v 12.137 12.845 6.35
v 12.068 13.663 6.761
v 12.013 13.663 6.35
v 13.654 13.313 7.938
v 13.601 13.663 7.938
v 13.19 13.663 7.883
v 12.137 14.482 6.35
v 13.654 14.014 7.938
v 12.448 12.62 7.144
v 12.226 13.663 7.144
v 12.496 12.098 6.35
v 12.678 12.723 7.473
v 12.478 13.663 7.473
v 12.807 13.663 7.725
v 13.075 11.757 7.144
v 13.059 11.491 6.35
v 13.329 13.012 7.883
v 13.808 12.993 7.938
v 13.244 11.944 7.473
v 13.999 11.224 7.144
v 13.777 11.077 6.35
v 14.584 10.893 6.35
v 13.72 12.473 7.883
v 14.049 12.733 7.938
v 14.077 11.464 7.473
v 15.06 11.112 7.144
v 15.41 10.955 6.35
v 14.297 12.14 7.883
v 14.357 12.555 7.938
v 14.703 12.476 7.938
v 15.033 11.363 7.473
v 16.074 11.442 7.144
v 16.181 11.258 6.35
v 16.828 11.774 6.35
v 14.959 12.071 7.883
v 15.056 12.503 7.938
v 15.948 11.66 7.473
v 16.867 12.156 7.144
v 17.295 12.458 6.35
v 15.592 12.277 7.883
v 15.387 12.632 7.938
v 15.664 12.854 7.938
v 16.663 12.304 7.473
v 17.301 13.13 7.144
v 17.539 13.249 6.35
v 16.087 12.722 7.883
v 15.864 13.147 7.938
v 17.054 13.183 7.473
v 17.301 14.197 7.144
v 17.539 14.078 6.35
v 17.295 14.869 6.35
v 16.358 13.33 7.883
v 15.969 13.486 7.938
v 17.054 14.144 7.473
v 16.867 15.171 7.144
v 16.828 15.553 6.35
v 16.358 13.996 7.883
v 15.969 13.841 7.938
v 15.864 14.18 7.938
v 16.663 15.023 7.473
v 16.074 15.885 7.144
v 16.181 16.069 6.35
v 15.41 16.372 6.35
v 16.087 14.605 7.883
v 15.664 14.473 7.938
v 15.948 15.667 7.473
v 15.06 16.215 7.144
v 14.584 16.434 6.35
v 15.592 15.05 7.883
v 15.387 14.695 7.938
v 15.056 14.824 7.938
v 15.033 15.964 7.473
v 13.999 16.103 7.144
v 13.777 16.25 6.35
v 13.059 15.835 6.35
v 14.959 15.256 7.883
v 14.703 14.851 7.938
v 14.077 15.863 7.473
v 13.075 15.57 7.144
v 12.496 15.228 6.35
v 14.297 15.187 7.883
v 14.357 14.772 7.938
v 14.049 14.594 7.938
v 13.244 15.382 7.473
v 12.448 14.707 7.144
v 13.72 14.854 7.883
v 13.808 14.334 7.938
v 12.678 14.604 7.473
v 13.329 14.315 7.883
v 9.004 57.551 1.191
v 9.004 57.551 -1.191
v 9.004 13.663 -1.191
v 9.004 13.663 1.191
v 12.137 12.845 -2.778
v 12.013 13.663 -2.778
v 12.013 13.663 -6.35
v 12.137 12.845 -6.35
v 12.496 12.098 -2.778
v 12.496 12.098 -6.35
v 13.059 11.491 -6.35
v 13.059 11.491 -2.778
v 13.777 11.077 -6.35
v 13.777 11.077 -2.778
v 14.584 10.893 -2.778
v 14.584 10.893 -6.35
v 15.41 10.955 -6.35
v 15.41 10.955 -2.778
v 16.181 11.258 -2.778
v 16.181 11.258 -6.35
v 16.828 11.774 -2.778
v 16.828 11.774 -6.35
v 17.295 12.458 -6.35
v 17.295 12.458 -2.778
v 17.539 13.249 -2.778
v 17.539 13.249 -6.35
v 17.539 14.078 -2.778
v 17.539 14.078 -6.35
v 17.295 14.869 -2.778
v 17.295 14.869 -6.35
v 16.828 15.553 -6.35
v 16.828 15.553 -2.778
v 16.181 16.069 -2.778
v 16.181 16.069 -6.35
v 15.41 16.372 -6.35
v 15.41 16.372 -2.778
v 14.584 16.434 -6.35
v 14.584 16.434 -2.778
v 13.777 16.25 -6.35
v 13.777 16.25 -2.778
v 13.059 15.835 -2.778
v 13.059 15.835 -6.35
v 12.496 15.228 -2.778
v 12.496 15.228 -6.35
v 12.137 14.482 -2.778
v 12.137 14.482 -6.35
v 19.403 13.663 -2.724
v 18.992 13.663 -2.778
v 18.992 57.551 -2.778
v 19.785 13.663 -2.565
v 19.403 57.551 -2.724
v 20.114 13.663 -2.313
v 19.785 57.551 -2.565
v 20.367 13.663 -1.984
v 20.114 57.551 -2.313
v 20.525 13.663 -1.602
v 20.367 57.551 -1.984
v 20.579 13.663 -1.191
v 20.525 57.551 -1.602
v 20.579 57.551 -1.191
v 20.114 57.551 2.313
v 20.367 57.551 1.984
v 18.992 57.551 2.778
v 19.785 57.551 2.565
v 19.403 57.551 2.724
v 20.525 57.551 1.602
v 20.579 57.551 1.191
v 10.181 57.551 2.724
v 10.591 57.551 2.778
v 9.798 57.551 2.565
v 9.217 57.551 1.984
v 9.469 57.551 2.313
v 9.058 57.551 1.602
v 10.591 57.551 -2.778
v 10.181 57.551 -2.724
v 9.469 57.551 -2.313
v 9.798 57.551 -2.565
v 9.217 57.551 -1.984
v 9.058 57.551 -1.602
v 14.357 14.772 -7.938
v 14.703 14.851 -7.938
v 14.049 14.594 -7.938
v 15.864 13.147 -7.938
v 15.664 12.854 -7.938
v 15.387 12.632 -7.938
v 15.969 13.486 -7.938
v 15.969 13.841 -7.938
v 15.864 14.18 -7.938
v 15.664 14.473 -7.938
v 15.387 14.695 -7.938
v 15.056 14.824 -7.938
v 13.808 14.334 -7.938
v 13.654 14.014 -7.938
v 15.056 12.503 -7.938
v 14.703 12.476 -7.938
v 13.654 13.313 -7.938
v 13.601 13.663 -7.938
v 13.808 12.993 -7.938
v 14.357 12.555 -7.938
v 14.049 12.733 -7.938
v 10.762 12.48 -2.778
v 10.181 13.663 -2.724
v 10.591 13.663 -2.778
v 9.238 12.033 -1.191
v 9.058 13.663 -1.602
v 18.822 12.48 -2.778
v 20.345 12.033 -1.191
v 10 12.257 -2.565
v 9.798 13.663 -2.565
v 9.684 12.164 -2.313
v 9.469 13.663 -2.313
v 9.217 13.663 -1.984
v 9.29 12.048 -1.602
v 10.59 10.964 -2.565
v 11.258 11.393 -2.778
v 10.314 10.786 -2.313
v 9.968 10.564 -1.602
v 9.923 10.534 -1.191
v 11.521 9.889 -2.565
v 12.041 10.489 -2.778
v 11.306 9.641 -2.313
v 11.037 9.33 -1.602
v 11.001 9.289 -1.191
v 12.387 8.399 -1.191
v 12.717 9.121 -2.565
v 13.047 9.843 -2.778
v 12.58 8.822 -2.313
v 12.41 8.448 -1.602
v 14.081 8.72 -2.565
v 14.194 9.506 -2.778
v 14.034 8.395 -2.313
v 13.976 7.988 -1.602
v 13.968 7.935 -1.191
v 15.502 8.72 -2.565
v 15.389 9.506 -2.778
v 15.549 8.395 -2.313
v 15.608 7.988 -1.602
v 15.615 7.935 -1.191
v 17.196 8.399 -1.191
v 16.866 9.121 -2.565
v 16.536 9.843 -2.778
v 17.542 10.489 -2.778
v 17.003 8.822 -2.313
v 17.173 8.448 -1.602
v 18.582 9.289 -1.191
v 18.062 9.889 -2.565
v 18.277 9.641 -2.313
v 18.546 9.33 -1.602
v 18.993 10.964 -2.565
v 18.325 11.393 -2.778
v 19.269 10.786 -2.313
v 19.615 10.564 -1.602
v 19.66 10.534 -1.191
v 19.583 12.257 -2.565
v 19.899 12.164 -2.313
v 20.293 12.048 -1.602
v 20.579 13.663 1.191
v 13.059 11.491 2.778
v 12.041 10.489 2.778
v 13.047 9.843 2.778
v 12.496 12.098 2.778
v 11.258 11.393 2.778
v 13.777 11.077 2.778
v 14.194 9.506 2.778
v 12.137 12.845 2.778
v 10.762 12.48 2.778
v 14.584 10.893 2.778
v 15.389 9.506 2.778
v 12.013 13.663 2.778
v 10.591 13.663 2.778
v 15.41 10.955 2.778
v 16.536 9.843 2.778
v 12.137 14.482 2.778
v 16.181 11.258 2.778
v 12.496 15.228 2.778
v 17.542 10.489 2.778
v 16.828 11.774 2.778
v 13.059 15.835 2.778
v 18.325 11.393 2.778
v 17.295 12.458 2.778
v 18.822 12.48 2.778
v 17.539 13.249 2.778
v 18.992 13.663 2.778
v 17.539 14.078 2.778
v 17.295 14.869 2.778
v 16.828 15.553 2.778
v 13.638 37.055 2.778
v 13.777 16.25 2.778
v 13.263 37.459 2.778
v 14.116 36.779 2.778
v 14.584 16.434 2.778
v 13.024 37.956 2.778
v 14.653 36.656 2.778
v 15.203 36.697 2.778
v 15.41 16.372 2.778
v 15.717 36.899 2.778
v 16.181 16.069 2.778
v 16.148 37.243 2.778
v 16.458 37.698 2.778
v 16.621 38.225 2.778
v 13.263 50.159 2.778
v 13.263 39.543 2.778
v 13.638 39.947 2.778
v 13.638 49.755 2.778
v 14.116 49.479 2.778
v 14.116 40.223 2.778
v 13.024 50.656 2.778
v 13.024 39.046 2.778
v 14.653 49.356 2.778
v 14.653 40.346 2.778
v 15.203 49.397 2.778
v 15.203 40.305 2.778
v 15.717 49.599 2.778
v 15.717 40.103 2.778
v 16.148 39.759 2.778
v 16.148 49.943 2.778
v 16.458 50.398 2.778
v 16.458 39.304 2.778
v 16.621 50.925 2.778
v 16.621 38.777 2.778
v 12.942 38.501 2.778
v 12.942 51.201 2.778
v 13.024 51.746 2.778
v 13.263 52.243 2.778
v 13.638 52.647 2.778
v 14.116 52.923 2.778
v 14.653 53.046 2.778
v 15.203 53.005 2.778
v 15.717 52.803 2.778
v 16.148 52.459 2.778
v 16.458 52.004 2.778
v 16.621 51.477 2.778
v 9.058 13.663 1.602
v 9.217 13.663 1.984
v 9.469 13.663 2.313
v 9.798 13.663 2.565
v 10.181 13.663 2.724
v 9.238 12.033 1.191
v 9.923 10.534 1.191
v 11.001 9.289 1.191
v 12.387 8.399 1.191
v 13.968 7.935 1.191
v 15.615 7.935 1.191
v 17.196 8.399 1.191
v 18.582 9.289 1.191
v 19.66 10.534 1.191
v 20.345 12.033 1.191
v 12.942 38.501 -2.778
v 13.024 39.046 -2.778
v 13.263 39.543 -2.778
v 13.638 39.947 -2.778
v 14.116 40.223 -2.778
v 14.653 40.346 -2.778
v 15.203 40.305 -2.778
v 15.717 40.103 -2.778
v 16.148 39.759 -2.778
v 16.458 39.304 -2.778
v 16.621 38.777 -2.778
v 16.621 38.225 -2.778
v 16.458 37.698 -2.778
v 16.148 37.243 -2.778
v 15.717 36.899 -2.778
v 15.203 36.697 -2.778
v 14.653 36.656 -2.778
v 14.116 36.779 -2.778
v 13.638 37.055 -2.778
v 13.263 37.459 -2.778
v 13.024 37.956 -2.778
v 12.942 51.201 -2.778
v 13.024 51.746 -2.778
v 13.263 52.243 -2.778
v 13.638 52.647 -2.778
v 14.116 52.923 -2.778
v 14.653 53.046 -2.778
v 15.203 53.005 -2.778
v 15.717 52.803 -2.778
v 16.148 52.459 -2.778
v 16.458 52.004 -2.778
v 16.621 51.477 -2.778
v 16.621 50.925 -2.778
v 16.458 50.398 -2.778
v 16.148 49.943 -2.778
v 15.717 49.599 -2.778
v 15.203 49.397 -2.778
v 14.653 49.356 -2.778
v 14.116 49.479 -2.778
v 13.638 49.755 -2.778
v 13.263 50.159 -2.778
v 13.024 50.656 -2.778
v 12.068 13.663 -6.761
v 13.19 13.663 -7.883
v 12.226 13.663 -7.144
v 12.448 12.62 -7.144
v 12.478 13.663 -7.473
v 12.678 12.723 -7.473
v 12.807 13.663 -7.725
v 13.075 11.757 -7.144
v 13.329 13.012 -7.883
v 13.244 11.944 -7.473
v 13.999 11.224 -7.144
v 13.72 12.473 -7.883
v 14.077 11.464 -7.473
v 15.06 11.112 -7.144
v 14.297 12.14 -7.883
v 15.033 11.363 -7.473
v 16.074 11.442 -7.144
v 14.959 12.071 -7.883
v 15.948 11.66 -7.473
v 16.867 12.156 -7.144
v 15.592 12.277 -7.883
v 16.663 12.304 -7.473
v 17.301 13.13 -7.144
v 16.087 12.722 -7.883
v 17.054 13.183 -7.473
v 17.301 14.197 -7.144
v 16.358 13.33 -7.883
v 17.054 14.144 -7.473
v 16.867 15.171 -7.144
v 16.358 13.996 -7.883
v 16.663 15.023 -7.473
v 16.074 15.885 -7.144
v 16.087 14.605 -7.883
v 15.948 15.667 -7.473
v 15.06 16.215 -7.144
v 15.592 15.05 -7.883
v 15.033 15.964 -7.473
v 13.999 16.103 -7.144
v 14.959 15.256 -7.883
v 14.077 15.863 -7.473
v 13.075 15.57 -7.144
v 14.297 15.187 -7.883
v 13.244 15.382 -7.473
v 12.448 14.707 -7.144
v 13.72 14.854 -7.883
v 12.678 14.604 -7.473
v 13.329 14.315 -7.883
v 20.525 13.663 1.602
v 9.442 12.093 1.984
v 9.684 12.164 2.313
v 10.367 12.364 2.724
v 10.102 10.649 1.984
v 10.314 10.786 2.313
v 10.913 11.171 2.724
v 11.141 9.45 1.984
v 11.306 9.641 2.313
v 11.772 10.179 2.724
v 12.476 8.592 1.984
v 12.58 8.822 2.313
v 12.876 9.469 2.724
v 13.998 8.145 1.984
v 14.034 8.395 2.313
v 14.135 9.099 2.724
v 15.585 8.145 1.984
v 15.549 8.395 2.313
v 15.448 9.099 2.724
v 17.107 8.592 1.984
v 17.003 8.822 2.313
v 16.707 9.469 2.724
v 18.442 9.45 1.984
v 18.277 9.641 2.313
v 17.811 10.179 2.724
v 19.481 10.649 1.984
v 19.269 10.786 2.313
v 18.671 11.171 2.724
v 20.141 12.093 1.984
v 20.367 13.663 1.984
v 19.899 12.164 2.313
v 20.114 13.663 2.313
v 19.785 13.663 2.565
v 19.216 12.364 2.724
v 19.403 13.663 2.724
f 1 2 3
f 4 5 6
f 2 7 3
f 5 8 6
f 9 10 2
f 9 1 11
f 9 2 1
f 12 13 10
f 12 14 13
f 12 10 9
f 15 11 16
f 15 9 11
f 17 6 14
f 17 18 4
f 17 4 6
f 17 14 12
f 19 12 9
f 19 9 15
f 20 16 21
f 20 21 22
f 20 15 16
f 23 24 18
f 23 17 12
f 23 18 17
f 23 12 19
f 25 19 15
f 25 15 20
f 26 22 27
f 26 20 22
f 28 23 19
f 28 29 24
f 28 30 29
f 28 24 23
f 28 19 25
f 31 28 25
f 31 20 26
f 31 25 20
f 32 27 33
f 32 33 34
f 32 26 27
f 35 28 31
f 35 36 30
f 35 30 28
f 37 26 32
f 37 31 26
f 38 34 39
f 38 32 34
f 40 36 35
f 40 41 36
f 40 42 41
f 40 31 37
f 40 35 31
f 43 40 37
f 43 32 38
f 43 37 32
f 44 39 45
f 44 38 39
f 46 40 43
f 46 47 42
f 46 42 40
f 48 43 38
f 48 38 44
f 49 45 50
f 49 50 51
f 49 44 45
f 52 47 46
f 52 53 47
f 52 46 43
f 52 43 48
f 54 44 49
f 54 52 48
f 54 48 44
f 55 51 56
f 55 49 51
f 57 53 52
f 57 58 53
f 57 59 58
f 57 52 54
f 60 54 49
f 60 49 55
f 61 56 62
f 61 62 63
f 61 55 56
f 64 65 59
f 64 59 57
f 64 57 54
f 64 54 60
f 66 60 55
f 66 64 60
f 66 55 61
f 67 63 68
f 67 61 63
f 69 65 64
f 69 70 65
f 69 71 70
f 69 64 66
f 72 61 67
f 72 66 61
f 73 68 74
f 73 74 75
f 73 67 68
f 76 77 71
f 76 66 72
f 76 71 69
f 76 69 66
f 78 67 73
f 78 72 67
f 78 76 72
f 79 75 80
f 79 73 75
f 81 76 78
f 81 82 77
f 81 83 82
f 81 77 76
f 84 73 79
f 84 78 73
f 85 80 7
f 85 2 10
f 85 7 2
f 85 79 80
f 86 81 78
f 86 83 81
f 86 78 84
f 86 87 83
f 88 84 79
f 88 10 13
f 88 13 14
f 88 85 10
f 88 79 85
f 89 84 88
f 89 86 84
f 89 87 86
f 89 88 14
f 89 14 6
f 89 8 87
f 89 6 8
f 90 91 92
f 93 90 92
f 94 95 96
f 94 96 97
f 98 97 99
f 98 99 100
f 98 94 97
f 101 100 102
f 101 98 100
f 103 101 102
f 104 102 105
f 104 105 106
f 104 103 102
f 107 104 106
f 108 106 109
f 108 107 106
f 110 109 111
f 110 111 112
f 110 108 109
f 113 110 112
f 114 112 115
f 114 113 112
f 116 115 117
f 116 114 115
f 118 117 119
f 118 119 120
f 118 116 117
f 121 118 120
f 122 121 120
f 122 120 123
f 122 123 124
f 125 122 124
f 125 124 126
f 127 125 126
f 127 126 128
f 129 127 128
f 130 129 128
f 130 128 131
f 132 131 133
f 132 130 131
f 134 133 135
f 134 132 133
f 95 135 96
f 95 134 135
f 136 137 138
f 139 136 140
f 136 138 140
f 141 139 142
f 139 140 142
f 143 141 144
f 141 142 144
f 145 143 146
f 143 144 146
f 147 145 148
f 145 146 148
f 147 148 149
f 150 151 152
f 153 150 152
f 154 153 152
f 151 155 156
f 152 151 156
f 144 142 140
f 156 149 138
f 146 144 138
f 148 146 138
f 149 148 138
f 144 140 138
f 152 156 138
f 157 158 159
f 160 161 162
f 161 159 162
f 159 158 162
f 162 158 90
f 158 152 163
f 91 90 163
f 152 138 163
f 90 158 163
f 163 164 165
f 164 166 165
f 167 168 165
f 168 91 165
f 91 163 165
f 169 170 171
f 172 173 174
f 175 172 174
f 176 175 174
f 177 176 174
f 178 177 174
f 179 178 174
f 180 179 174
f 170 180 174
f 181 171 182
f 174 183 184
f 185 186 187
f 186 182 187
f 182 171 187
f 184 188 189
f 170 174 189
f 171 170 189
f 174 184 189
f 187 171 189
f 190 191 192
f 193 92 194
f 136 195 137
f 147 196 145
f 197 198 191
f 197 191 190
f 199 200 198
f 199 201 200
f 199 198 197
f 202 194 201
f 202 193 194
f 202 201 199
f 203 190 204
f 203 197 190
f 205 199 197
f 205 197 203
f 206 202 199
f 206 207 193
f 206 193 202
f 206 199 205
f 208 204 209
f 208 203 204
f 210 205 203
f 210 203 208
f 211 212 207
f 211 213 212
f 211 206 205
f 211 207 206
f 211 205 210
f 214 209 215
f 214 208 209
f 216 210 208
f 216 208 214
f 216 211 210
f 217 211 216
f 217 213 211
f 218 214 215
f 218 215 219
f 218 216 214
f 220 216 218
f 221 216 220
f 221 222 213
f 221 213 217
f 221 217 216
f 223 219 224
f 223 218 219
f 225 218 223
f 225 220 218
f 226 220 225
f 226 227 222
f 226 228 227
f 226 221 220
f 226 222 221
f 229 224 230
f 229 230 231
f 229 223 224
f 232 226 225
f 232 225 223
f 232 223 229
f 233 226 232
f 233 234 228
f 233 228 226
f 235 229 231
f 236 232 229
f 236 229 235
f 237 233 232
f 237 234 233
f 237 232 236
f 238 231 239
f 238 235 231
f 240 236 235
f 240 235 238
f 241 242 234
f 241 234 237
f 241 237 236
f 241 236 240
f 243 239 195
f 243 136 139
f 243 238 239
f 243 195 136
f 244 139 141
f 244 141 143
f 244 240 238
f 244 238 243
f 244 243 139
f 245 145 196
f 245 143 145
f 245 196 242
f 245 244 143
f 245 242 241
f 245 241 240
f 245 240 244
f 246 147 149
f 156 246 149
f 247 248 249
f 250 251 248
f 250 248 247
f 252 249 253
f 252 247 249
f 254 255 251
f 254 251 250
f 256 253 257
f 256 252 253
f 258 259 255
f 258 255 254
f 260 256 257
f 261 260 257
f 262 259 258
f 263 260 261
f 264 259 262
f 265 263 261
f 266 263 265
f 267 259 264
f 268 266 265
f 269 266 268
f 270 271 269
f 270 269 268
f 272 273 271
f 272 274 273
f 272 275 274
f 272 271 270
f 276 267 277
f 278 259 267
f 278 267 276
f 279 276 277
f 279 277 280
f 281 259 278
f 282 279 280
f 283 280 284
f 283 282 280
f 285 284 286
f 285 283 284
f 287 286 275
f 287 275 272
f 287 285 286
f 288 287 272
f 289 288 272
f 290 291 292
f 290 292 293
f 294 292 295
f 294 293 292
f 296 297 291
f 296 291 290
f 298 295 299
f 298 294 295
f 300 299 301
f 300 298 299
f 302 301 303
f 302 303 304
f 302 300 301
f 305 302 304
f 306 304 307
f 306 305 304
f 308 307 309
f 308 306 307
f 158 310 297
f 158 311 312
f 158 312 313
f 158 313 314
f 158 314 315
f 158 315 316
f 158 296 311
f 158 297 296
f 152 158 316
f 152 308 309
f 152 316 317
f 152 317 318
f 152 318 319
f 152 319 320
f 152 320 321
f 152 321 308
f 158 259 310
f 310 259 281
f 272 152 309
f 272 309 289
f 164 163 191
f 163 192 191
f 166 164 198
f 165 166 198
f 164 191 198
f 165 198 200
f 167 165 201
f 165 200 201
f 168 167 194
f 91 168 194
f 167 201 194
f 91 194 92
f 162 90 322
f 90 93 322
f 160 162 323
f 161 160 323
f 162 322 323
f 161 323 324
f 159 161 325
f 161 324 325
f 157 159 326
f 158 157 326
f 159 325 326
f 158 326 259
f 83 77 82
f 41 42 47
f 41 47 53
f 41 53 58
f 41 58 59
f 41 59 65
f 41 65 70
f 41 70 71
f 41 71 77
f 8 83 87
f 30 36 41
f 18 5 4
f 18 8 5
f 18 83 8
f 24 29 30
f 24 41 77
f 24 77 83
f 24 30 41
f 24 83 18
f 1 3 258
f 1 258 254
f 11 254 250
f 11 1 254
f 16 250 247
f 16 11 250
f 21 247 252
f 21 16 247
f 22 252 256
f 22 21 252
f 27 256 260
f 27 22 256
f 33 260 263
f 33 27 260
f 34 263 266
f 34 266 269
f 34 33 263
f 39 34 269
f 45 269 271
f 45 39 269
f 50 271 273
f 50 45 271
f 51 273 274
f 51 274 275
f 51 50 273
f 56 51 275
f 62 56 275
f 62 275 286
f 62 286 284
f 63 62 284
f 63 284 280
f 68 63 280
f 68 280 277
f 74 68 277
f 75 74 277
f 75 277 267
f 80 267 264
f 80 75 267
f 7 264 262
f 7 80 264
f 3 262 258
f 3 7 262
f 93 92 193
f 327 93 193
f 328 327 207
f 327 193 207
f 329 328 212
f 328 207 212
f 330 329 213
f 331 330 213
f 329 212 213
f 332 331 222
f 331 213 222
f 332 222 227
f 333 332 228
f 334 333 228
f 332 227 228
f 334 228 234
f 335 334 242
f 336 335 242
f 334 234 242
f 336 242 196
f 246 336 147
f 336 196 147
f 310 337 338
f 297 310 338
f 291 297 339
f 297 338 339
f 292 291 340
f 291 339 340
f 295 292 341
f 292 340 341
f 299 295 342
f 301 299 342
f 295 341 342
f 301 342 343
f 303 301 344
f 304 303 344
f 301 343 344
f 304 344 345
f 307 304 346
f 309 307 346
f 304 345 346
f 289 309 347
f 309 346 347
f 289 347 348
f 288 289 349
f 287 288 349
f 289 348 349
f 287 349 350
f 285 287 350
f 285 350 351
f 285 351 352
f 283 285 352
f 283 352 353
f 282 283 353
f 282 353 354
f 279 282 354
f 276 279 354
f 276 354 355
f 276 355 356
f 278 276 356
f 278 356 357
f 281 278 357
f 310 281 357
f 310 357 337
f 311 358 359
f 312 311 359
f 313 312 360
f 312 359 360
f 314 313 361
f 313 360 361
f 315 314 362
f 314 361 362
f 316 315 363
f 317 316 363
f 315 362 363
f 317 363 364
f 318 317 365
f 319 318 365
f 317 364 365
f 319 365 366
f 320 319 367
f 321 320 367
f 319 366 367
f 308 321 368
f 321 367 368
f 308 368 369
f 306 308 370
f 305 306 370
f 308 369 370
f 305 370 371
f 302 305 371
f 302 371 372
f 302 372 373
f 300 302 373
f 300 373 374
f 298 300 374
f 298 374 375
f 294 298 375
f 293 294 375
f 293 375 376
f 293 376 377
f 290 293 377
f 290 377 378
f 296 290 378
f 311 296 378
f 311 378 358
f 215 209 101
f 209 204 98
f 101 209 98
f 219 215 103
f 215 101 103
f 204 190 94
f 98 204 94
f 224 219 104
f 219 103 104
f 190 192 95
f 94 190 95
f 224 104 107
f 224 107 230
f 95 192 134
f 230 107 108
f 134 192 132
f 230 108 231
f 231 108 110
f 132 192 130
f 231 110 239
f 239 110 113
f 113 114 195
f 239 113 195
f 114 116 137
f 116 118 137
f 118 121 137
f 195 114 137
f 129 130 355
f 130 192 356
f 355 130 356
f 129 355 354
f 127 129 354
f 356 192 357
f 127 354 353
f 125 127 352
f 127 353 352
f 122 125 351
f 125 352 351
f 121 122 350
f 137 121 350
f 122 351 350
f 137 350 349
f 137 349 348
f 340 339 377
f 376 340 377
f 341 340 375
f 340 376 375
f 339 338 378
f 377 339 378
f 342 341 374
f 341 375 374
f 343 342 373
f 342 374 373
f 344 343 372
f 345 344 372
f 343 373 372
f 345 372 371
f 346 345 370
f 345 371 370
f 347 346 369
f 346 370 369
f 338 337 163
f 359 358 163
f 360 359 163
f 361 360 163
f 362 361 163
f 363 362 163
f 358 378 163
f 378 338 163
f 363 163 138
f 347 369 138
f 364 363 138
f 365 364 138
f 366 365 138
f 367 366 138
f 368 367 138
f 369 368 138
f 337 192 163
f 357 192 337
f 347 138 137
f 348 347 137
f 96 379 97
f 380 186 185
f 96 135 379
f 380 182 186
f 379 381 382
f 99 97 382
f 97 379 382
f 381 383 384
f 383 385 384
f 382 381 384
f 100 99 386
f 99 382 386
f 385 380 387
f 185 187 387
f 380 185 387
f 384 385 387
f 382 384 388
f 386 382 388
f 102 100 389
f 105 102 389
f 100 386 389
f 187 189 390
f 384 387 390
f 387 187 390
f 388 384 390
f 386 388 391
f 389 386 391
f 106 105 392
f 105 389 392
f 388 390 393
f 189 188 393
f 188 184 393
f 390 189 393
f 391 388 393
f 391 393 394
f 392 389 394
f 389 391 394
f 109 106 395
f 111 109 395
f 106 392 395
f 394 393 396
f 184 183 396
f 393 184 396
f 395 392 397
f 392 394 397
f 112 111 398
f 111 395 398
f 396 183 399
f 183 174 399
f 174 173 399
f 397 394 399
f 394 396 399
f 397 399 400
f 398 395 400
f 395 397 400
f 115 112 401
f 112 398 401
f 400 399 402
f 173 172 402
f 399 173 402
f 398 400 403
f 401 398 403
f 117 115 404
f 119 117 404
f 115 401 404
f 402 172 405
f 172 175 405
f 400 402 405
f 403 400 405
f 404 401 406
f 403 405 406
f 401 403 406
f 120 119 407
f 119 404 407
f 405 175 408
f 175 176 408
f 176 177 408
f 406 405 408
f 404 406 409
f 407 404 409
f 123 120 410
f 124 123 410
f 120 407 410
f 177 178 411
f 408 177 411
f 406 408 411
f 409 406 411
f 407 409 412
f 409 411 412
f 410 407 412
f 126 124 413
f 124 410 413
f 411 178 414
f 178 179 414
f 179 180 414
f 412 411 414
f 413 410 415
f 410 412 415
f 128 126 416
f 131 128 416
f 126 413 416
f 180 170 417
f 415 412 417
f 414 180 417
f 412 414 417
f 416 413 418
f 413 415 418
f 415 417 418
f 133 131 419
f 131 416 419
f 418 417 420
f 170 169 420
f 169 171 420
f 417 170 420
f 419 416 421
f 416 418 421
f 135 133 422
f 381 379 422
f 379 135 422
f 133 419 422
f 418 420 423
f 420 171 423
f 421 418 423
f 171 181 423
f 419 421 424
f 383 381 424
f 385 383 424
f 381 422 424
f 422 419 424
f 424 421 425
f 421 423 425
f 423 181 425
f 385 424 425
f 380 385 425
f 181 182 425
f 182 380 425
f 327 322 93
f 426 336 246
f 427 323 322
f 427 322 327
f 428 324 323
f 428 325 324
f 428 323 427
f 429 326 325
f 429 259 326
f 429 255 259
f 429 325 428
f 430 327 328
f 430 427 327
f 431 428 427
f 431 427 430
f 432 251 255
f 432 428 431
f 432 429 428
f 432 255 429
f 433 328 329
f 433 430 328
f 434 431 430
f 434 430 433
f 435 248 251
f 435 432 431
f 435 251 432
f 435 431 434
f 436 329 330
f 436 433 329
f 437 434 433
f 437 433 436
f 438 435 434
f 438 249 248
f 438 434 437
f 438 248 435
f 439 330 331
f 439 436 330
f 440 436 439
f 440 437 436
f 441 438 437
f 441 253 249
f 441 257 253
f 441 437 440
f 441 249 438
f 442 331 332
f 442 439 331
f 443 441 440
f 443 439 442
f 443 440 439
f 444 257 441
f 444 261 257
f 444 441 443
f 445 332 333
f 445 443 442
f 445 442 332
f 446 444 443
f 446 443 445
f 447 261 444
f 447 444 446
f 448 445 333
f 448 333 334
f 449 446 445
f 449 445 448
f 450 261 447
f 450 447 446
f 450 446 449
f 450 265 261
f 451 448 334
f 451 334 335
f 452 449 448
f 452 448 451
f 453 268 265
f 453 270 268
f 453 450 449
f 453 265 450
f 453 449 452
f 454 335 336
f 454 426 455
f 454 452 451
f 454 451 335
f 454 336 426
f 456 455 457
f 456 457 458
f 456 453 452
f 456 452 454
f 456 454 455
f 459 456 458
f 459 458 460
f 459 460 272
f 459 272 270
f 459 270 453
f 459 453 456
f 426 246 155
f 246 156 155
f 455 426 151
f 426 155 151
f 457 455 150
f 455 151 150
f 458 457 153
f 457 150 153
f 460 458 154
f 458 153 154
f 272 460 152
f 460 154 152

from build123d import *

# Parameters (mm, degrees)
BOSS_EXTRUDE1_DEPTH          = 2.778125
BOSS_EXTRUDE1_DEPTH_BACK     = 2.778125
SKETCH2_R                    = 2.778125
BOSS_EXTRUDE2_DEPTH          = 7.9375
F_97_0_0059_DIAMETER_HOLE1_D = 3.699999966
FILLET1_R                    = 1.5875
FILLET2_R                    = 1.5875


with BuildPart() as part:
    # Sketch1 → Boss-Extrude1 (new, two sides: drawn at the far end of the back side and taken through both)
    with BuildSketch(Plane.XY.offset(-BOSS_EXTRUDE1_DEPTH_BACK)):
        with BuildLine():
            Line((20.579185749, 13.663463824), (20.579185749, 57.551094031))
            Line((20.579185749, 57.551094031), (9.003925336, 57.551094031))
            Line((9.003925336, 57.551094031), (9.003925336, 13.663463824))
            ThreePointArc((9.003925336, 13.663463824), (14.791555542, 7.875833618), (20.579185749, 13.663463824))
        make_face()
    extrude(amount=BOSS_EXTRUDE1_DEPTH + BOSS_EXTRUDE1_DEPTH_BACK)

    # Sketch2 → Boss-Extrude2 (add, symmetric)
    with BuildSketch(Plane.XY):
        with Locations(Location((14.791555542, 13.663463824, 0), (0, 0, 180))):
            Circle(SKETCH2_R)
    extrude(amount=BOSS_EXTRUDE2_DEPTH, both=True)

    # #97 (0.0059) Diameter Hole1 (through all)
    with Locations(Plane.XY.offset(2.778125)):
        with Locations((14.791555542, 51.201094031), (14.791555542, 38.501094031)):
            Hole(F_97_0_0059_DIAMETER_HOLE1_D / 2)

    # Fillet1
    fillet1_edges = [part.edges().sort_by_distance(p)[0] for p in [
        (17.569680542, 13.663463824, -7.9375),
        (17.569680542, 13.663463824, 7.9375),
    ]]
    fillet(fillet1_edges, radius=FILLET1_R)

    # Fillet2
    fillet2_edges = [part.edges().sort_by_distance(p)[0] for p in [
        (9.003925336, 35.607278928, 2.778125),
        (20.579185749, 35.607278928, 2.778125),
        (14.791555542, 7.875833618, 2.778125),
        (20.579185749, 35.607278928, -2.778125),
        (9.003925336, 35.607278928, -2.778125),
        (14.791555542, 7.875833618, -2.778125),
    ]]
    fillet(fillet2_edges, radius=FILLET2_R)


solid = part.part
